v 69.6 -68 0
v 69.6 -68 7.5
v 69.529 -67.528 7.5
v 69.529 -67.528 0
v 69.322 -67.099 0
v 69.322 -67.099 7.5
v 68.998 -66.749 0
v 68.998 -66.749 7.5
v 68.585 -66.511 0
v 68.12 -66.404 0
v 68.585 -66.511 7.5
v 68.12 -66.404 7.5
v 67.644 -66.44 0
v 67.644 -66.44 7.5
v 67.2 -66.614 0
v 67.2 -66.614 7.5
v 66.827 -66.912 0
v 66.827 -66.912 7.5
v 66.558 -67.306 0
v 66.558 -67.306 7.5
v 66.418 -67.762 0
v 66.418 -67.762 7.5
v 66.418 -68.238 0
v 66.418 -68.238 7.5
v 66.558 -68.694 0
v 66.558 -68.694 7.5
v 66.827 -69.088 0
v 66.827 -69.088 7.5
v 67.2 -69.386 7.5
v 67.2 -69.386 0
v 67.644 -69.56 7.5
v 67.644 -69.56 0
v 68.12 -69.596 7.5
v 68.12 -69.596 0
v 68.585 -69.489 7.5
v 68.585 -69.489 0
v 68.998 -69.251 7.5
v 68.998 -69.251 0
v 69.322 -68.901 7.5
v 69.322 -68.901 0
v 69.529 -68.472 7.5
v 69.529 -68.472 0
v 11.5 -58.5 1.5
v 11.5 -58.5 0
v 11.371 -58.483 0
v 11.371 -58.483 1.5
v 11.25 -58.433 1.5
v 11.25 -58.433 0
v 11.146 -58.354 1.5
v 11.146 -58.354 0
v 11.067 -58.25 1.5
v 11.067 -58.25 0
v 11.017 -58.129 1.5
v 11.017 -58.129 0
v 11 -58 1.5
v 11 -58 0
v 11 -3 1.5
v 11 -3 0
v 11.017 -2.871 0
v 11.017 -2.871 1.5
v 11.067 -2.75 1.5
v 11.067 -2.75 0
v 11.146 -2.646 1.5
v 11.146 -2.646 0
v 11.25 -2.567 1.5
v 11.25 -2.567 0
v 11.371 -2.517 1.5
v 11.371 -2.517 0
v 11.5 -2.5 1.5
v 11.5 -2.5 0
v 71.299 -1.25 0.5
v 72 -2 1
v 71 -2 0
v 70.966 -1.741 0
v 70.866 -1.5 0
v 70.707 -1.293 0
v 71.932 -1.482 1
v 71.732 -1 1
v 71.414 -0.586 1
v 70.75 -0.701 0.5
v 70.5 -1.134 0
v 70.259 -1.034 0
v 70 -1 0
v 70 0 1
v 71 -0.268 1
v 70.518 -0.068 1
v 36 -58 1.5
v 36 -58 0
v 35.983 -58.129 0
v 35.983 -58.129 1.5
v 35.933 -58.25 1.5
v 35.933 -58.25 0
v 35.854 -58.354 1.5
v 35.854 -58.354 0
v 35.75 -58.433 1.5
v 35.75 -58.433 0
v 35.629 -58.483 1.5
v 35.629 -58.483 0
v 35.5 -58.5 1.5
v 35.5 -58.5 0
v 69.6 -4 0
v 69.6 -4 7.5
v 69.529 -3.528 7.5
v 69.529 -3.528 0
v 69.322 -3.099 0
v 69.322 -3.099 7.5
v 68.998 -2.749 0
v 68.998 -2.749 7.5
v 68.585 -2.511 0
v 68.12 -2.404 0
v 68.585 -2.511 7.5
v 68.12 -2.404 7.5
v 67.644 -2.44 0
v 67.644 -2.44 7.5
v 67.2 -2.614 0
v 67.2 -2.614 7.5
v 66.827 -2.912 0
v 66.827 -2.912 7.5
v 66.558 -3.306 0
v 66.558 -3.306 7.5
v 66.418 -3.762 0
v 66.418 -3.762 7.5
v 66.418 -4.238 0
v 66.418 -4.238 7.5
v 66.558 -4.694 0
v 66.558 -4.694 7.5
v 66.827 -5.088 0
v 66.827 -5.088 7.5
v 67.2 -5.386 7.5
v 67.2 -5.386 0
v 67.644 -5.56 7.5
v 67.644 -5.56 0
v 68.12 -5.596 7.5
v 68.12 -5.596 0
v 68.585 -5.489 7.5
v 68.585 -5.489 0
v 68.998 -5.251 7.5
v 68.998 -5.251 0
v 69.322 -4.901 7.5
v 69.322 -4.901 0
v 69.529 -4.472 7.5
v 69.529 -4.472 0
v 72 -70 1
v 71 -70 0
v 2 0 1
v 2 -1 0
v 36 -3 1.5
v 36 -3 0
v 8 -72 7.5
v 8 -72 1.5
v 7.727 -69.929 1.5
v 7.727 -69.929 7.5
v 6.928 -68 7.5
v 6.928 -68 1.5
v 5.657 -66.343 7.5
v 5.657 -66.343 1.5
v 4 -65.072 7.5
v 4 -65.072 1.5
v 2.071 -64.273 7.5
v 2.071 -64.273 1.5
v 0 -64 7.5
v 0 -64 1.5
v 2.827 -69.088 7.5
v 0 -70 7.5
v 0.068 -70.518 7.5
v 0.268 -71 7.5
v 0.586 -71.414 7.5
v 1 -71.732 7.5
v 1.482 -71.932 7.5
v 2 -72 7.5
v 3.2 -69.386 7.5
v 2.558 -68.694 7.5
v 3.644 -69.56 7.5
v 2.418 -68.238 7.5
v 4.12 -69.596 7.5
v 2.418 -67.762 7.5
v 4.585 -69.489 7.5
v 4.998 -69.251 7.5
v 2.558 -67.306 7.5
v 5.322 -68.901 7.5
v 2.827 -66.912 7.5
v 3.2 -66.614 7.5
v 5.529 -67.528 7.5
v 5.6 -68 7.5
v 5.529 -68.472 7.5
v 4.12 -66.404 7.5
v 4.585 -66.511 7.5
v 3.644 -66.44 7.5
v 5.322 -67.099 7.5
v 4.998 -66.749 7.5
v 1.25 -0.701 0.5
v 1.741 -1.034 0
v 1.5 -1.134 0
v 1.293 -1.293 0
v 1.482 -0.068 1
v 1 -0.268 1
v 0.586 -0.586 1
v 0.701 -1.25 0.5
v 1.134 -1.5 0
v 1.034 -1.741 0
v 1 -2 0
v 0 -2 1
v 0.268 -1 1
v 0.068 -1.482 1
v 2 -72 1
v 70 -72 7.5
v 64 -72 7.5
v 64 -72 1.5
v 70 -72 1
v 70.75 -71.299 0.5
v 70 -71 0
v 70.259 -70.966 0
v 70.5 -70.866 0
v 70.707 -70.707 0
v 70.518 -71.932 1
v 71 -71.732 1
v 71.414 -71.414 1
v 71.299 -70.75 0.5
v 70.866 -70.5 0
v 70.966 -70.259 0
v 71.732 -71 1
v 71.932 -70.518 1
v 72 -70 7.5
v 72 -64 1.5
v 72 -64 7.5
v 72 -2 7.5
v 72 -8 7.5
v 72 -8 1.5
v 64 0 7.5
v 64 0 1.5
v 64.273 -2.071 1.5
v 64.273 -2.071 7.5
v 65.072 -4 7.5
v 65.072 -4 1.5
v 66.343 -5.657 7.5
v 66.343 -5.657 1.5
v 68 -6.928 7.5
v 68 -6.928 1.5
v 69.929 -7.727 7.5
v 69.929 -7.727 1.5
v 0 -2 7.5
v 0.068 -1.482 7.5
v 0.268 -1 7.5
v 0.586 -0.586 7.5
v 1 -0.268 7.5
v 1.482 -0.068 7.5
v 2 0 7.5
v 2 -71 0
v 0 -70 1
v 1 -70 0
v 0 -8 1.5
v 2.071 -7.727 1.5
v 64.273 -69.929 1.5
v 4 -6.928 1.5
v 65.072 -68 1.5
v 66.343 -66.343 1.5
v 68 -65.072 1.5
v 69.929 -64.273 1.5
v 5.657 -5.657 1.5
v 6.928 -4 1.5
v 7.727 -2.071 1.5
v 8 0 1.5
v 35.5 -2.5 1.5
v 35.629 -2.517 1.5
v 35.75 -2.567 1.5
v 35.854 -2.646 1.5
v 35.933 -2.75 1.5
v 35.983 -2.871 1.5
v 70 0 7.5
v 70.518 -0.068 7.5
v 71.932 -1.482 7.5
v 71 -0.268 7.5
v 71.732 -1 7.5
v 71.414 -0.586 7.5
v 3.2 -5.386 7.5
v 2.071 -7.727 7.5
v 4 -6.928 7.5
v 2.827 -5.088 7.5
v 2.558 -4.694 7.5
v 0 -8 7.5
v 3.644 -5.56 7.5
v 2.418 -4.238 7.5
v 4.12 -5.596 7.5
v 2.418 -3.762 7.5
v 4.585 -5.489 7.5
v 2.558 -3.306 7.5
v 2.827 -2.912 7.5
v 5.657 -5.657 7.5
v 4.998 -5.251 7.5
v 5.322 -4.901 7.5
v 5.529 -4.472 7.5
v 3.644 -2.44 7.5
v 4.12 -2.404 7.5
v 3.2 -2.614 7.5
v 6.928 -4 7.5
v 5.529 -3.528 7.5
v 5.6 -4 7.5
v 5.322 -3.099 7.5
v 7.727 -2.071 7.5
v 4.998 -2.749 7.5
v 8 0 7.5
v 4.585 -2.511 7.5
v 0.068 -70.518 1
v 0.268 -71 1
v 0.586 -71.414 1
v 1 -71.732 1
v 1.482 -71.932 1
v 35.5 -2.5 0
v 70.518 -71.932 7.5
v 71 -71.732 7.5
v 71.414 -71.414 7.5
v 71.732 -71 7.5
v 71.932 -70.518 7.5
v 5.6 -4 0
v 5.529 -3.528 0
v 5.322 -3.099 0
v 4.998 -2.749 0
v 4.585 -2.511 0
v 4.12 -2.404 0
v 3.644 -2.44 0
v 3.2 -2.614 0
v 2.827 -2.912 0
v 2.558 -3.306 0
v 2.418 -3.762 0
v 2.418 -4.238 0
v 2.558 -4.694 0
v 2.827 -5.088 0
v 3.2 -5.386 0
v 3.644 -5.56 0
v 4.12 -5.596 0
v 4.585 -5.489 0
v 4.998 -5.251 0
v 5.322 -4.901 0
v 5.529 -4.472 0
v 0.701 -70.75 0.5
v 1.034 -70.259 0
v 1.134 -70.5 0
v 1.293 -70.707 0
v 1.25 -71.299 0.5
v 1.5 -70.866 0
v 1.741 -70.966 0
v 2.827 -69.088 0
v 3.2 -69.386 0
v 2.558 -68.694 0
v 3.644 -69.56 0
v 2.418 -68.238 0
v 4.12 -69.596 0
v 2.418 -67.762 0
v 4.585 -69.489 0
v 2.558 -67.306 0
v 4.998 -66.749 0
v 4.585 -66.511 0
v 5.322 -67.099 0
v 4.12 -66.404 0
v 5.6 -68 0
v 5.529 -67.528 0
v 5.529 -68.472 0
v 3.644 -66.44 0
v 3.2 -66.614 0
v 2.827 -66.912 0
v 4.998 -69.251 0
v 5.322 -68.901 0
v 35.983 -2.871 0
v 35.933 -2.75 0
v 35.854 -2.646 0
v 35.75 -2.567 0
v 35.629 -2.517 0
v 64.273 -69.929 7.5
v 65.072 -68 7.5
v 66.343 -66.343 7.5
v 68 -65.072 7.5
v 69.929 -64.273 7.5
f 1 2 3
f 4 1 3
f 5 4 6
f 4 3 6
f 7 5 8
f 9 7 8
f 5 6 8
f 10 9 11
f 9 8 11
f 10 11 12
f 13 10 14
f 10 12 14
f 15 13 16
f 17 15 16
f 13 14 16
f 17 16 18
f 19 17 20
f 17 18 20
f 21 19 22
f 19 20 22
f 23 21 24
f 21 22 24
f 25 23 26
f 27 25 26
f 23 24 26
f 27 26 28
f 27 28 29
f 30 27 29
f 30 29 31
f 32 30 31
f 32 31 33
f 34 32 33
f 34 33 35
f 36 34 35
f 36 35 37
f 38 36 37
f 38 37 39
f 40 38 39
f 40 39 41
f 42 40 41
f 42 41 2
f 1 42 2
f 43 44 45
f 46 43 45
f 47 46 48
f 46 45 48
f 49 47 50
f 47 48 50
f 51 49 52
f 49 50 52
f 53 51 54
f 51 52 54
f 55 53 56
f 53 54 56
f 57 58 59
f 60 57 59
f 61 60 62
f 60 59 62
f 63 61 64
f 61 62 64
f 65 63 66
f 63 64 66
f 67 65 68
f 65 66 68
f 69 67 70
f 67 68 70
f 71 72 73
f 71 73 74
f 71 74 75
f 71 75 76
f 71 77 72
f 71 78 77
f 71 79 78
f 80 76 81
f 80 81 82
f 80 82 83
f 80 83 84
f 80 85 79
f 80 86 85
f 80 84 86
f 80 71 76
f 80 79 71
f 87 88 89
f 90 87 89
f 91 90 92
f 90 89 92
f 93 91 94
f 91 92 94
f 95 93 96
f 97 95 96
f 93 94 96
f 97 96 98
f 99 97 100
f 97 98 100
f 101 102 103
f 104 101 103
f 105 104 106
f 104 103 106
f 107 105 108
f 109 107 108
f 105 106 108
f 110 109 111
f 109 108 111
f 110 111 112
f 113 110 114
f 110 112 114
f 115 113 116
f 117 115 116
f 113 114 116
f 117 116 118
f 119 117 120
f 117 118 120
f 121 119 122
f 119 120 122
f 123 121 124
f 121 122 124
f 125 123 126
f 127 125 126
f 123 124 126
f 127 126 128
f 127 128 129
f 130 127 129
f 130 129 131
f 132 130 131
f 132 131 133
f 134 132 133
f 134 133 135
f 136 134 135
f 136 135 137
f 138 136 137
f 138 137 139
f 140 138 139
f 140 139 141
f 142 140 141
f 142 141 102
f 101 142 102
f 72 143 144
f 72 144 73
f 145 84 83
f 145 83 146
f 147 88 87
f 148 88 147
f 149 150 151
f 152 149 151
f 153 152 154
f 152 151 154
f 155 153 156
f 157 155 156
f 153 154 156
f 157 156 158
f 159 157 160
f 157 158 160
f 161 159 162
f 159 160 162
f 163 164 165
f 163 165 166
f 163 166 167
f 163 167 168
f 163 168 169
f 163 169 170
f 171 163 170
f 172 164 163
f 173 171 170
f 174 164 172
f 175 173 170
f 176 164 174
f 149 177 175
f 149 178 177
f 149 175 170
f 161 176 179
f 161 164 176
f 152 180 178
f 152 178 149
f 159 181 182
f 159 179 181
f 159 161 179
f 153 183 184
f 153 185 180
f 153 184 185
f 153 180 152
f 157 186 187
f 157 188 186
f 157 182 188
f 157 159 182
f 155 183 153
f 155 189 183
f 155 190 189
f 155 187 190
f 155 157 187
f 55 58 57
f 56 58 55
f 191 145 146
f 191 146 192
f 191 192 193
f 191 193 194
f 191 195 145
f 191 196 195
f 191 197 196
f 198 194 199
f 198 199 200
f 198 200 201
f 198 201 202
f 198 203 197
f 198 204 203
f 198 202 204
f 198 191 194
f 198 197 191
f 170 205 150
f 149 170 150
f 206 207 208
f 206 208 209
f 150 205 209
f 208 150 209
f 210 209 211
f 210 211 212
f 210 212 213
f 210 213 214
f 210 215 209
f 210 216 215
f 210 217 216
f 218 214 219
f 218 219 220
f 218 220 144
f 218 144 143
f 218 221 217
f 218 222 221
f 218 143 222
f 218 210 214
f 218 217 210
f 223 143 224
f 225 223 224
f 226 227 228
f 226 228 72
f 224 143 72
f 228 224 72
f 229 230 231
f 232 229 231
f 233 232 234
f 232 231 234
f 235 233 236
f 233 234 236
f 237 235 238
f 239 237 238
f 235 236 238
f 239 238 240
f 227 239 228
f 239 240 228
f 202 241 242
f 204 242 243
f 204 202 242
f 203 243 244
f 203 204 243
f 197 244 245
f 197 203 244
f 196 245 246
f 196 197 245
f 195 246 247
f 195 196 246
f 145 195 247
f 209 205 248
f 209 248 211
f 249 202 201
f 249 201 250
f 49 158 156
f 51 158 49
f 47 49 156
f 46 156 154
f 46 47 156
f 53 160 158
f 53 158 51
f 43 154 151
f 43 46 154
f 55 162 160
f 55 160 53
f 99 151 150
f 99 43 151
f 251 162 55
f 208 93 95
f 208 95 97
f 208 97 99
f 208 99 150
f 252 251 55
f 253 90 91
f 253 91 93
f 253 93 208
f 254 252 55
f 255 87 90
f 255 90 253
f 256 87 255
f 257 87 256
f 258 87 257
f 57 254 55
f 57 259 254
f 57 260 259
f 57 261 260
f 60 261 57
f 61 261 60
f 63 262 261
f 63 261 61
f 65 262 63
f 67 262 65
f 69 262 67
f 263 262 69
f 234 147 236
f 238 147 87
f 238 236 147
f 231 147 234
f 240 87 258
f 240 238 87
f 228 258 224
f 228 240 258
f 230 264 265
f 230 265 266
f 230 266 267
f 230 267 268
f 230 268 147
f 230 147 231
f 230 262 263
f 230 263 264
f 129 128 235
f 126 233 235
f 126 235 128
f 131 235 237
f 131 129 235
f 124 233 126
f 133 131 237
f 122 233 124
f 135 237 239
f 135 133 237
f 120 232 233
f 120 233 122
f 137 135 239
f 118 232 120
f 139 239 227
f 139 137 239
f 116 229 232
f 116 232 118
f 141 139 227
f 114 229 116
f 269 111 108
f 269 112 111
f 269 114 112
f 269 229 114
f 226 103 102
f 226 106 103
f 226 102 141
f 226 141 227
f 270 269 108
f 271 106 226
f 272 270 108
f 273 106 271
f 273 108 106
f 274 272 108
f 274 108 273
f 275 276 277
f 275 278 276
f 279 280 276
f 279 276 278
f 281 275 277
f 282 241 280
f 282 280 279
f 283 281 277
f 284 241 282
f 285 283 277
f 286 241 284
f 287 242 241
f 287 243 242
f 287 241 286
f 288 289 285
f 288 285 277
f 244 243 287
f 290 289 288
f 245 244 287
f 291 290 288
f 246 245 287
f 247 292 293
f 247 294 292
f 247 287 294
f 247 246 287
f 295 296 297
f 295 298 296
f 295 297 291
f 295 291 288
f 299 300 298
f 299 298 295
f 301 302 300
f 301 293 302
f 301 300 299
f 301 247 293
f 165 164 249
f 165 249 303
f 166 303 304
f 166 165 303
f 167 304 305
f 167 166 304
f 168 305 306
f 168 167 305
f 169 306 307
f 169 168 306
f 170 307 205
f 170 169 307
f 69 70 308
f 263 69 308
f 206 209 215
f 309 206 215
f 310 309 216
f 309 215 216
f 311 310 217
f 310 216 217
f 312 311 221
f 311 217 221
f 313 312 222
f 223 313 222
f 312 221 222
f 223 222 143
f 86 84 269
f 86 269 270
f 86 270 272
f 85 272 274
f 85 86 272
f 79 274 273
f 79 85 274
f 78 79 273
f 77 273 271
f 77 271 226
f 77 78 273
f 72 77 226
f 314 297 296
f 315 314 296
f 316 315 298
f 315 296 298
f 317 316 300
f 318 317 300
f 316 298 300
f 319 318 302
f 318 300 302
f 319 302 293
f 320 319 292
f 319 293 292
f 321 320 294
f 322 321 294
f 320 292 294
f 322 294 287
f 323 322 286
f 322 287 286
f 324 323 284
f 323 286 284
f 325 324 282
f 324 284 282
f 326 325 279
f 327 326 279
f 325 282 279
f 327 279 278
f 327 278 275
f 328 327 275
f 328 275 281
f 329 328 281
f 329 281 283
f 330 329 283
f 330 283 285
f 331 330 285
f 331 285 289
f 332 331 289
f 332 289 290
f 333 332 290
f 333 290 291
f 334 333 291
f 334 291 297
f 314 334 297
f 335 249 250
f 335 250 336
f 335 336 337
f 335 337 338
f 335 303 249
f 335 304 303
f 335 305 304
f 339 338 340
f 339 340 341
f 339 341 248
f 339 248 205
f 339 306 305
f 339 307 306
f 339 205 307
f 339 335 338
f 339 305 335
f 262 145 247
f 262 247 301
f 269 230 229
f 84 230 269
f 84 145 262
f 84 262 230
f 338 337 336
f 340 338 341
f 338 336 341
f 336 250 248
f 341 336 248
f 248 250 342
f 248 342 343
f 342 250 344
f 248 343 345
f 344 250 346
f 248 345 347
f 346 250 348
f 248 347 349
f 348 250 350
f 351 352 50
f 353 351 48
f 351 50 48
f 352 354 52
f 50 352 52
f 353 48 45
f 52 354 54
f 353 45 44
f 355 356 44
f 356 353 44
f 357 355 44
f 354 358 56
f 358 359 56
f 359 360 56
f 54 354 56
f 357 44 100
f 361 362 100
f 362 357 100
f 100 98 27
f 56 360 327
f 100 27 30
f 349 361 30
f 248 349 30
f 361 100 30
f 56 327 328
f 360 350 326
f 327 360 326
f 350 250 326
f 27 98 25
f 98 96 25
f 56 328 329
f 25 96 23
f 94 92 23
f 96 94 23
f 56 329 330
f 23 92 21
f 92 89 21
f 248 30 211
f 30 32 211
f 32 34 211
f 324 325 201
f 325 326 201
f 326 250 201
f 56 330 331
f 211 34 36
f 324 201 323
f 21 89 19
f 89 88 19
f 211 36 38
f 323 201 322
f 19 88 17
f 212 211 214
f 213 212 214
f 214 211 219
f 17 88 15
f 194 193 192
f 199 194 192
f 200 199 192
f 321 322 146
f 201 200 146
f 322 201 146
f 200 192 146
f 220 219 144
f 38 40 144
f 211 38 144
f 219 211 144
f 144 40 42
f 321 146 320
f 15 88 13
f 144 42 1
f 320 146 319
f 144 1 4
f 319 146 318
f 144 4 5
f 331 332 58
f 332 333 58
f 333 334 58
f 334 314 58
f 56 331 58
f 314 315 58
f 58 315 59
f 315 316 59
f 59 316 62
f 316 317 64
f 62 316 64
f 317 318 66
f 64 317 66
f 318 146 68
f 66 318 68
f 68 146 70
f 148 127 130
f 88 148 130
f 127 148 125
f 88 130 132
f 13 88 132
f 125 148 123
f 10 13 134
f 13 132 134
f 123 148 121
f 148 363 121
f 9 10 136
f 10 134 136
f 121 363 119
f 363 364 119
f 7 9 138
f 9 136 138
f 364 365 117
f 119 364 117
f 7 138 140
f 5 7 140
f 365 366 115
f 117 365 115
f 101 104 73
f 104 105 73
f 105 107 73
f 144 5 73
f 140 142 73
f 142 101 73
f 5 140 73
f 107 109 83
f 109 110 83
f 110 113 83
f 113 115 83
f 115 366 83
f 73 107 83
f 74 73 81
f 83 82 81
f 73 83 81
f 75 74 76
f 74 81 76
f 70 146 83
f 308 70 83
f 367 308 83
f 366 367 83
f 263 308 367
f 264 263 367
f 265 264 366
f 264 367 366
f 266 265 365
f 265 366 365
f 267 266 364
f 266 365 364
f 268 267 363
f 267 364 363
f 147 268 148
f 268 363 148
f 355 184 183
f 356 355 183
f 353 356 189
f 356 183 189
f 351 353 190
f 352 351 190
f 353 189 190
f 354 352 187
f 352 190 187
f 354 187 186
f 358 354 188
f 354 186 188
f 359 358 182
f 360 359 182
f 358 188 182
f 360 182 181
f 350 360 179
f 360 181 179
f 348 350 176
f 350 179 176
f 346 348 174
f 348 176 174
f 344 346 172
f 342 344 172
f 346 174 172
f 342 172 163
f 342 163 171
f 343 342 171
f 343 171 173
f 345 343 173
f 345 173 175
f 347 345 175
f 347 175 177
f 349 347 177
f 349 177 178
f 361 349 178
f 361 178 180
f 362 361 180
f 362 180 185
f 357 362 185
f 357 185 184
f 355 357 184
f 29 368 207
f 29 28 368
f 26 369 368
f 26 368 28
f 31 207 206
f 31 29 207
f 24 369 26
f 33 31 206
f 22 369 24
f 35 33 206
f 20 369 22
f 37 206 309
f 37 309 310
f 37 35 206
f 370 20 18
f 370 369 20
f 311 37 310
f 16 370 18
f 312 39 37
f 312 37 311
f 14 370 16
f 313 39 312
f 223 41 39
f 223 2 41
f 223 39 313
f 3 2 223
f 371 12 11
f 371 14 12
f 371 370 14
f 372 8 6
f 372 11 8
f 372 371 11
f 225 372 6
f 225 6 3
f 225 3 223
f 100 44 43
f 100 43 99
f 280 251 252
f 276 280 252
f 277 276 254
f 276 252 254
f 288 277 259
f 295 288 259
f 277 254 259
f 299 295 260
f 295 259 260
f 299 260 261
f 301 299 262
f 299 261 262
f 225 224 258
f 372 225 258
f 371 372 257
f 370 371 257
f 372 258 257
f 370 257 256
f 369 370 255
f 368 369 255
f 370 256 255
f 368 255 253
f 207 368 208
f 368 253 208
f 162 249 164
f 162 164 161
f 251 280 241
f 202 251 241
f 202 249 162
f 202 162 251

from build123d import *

# Parameters (mm, degrees)
SKETCH_W        = 72
SKETCH_H        = 72
PAD_DEPTH       = 1.5
PAD001_DEPTH    = 6
SKETCH002_R     = 1.6
POCKET_DEPTH    = 7.501
FILLET_R        = 2
CHAMFER_SIZE    = 1
POCKET001_DEPTH = 5


with BuildPart() as part:
    # Sketch → Pad (new body)
    with BuildSketch(Plane.XY):
        with Locations((36, -36)):
            Rectangle(SKETCH_W, SKETCH_H)
    extrude(amount=PAD_DEPTH)

    # Sketch001 (on Face6 of Pad) → Pad001 (join)
    with BuildSketch(Plane.XY.offset(1.5)):
        with BuildLine():
            ThreePointArc((0, -8), (5.656854, -5.656854), (8, 0))
            Line((0, 0), (8, 0))
            Line((0, -8), (0, 0))
        make_face()
        with BuildLine():
            ThreePointArc((8, -72), (5.656854, -66.343146), (0, -64))
            Line((0, -72), (0, -64))
            Line((8, -72), (0, -72))
        make_face()
        with BuildLine():
            ThreePointArc((72, -64), (66.343146, -66.343146), (64, -72))
            Line((64, -72), (72, -72))
            Line((72, -72), (72, -64))
        make_face()
        with BuildLine():
            ThreePointArc((64, 0), (66.343146, -5.656854), (72, -8))
            Line((72, -8), (72, 0))
            Line((72, 0), (64, 0))
        make_face()
    extrude(amount=PAD001_DEPTH)

    # Sketch002 (on Face14 of Pad001) → Pocket (cut, through all)
    with BuildSketch(Plane.XY.offset(7.5)):
        with Locations((4, -4)):
            Circle(SKETCH002_R)
        with Locations((68, -4)):
            Circle(SKETCH002_R)
        with Locations((68, -68)):
            Circle(SKETCH002_R)
        with Locations((4, -68)):
            Circle(SKETCH002_R)
    extrude(amount=-POCKET_DEPTH, mode=Mode.SUBTRACT)

    # Fillet
    fillet_edges = [part.edges().sort_by_distance(p)[0] for p in [
        (0, 0, 4.5),
        (72, 0, 4.5),
        (0, -72, 4.5),
        (72, -72, 4.5),
    ]]
    fillet(fillet_edges, radius=FILLET_R)

    # Chamfer
    chamfer_edges = [part.edges().sort_by_distance(p)[0] for p in [
        (36, -72, 0),
    ]]
    chamfer(chamfer_edges, length=CHAMFER_SIZE)

    # Sketch003 (on Face11 of Chamfer) → Pocket001 (cut)
    with BuildSketch(Plane(origin=(0, 0, 0), x_dir=(1, 0, 0), z_dir=(0, 0, -1))):
        with BuildLine():
            ThreePointArc((11, 3), (11.146447, 2.646447), (11.5, 2.5))
            Line((11.5, 2.5), (35.5, 2.5))
            ThreePointArc((35.5, 2.5), (35.853553, 2.646447), (36, 3))
            Line((36, 58), (36, 3))
            ThreePointArc((36, 58), (35.853553, 58.353553), (35.5, 58.5))
            Line((11.5, 58.5), (35.5, 58.5))
            ThreePointArc((11.5, 58.5), (11.146447, 58.353553), (11, 58))
            Line((11, 3), (11, 58))
        make_face()
    extrude(amount=-POCKET001_DEPTH, mode=Mode.SUBTRACT)


solid = part.part
